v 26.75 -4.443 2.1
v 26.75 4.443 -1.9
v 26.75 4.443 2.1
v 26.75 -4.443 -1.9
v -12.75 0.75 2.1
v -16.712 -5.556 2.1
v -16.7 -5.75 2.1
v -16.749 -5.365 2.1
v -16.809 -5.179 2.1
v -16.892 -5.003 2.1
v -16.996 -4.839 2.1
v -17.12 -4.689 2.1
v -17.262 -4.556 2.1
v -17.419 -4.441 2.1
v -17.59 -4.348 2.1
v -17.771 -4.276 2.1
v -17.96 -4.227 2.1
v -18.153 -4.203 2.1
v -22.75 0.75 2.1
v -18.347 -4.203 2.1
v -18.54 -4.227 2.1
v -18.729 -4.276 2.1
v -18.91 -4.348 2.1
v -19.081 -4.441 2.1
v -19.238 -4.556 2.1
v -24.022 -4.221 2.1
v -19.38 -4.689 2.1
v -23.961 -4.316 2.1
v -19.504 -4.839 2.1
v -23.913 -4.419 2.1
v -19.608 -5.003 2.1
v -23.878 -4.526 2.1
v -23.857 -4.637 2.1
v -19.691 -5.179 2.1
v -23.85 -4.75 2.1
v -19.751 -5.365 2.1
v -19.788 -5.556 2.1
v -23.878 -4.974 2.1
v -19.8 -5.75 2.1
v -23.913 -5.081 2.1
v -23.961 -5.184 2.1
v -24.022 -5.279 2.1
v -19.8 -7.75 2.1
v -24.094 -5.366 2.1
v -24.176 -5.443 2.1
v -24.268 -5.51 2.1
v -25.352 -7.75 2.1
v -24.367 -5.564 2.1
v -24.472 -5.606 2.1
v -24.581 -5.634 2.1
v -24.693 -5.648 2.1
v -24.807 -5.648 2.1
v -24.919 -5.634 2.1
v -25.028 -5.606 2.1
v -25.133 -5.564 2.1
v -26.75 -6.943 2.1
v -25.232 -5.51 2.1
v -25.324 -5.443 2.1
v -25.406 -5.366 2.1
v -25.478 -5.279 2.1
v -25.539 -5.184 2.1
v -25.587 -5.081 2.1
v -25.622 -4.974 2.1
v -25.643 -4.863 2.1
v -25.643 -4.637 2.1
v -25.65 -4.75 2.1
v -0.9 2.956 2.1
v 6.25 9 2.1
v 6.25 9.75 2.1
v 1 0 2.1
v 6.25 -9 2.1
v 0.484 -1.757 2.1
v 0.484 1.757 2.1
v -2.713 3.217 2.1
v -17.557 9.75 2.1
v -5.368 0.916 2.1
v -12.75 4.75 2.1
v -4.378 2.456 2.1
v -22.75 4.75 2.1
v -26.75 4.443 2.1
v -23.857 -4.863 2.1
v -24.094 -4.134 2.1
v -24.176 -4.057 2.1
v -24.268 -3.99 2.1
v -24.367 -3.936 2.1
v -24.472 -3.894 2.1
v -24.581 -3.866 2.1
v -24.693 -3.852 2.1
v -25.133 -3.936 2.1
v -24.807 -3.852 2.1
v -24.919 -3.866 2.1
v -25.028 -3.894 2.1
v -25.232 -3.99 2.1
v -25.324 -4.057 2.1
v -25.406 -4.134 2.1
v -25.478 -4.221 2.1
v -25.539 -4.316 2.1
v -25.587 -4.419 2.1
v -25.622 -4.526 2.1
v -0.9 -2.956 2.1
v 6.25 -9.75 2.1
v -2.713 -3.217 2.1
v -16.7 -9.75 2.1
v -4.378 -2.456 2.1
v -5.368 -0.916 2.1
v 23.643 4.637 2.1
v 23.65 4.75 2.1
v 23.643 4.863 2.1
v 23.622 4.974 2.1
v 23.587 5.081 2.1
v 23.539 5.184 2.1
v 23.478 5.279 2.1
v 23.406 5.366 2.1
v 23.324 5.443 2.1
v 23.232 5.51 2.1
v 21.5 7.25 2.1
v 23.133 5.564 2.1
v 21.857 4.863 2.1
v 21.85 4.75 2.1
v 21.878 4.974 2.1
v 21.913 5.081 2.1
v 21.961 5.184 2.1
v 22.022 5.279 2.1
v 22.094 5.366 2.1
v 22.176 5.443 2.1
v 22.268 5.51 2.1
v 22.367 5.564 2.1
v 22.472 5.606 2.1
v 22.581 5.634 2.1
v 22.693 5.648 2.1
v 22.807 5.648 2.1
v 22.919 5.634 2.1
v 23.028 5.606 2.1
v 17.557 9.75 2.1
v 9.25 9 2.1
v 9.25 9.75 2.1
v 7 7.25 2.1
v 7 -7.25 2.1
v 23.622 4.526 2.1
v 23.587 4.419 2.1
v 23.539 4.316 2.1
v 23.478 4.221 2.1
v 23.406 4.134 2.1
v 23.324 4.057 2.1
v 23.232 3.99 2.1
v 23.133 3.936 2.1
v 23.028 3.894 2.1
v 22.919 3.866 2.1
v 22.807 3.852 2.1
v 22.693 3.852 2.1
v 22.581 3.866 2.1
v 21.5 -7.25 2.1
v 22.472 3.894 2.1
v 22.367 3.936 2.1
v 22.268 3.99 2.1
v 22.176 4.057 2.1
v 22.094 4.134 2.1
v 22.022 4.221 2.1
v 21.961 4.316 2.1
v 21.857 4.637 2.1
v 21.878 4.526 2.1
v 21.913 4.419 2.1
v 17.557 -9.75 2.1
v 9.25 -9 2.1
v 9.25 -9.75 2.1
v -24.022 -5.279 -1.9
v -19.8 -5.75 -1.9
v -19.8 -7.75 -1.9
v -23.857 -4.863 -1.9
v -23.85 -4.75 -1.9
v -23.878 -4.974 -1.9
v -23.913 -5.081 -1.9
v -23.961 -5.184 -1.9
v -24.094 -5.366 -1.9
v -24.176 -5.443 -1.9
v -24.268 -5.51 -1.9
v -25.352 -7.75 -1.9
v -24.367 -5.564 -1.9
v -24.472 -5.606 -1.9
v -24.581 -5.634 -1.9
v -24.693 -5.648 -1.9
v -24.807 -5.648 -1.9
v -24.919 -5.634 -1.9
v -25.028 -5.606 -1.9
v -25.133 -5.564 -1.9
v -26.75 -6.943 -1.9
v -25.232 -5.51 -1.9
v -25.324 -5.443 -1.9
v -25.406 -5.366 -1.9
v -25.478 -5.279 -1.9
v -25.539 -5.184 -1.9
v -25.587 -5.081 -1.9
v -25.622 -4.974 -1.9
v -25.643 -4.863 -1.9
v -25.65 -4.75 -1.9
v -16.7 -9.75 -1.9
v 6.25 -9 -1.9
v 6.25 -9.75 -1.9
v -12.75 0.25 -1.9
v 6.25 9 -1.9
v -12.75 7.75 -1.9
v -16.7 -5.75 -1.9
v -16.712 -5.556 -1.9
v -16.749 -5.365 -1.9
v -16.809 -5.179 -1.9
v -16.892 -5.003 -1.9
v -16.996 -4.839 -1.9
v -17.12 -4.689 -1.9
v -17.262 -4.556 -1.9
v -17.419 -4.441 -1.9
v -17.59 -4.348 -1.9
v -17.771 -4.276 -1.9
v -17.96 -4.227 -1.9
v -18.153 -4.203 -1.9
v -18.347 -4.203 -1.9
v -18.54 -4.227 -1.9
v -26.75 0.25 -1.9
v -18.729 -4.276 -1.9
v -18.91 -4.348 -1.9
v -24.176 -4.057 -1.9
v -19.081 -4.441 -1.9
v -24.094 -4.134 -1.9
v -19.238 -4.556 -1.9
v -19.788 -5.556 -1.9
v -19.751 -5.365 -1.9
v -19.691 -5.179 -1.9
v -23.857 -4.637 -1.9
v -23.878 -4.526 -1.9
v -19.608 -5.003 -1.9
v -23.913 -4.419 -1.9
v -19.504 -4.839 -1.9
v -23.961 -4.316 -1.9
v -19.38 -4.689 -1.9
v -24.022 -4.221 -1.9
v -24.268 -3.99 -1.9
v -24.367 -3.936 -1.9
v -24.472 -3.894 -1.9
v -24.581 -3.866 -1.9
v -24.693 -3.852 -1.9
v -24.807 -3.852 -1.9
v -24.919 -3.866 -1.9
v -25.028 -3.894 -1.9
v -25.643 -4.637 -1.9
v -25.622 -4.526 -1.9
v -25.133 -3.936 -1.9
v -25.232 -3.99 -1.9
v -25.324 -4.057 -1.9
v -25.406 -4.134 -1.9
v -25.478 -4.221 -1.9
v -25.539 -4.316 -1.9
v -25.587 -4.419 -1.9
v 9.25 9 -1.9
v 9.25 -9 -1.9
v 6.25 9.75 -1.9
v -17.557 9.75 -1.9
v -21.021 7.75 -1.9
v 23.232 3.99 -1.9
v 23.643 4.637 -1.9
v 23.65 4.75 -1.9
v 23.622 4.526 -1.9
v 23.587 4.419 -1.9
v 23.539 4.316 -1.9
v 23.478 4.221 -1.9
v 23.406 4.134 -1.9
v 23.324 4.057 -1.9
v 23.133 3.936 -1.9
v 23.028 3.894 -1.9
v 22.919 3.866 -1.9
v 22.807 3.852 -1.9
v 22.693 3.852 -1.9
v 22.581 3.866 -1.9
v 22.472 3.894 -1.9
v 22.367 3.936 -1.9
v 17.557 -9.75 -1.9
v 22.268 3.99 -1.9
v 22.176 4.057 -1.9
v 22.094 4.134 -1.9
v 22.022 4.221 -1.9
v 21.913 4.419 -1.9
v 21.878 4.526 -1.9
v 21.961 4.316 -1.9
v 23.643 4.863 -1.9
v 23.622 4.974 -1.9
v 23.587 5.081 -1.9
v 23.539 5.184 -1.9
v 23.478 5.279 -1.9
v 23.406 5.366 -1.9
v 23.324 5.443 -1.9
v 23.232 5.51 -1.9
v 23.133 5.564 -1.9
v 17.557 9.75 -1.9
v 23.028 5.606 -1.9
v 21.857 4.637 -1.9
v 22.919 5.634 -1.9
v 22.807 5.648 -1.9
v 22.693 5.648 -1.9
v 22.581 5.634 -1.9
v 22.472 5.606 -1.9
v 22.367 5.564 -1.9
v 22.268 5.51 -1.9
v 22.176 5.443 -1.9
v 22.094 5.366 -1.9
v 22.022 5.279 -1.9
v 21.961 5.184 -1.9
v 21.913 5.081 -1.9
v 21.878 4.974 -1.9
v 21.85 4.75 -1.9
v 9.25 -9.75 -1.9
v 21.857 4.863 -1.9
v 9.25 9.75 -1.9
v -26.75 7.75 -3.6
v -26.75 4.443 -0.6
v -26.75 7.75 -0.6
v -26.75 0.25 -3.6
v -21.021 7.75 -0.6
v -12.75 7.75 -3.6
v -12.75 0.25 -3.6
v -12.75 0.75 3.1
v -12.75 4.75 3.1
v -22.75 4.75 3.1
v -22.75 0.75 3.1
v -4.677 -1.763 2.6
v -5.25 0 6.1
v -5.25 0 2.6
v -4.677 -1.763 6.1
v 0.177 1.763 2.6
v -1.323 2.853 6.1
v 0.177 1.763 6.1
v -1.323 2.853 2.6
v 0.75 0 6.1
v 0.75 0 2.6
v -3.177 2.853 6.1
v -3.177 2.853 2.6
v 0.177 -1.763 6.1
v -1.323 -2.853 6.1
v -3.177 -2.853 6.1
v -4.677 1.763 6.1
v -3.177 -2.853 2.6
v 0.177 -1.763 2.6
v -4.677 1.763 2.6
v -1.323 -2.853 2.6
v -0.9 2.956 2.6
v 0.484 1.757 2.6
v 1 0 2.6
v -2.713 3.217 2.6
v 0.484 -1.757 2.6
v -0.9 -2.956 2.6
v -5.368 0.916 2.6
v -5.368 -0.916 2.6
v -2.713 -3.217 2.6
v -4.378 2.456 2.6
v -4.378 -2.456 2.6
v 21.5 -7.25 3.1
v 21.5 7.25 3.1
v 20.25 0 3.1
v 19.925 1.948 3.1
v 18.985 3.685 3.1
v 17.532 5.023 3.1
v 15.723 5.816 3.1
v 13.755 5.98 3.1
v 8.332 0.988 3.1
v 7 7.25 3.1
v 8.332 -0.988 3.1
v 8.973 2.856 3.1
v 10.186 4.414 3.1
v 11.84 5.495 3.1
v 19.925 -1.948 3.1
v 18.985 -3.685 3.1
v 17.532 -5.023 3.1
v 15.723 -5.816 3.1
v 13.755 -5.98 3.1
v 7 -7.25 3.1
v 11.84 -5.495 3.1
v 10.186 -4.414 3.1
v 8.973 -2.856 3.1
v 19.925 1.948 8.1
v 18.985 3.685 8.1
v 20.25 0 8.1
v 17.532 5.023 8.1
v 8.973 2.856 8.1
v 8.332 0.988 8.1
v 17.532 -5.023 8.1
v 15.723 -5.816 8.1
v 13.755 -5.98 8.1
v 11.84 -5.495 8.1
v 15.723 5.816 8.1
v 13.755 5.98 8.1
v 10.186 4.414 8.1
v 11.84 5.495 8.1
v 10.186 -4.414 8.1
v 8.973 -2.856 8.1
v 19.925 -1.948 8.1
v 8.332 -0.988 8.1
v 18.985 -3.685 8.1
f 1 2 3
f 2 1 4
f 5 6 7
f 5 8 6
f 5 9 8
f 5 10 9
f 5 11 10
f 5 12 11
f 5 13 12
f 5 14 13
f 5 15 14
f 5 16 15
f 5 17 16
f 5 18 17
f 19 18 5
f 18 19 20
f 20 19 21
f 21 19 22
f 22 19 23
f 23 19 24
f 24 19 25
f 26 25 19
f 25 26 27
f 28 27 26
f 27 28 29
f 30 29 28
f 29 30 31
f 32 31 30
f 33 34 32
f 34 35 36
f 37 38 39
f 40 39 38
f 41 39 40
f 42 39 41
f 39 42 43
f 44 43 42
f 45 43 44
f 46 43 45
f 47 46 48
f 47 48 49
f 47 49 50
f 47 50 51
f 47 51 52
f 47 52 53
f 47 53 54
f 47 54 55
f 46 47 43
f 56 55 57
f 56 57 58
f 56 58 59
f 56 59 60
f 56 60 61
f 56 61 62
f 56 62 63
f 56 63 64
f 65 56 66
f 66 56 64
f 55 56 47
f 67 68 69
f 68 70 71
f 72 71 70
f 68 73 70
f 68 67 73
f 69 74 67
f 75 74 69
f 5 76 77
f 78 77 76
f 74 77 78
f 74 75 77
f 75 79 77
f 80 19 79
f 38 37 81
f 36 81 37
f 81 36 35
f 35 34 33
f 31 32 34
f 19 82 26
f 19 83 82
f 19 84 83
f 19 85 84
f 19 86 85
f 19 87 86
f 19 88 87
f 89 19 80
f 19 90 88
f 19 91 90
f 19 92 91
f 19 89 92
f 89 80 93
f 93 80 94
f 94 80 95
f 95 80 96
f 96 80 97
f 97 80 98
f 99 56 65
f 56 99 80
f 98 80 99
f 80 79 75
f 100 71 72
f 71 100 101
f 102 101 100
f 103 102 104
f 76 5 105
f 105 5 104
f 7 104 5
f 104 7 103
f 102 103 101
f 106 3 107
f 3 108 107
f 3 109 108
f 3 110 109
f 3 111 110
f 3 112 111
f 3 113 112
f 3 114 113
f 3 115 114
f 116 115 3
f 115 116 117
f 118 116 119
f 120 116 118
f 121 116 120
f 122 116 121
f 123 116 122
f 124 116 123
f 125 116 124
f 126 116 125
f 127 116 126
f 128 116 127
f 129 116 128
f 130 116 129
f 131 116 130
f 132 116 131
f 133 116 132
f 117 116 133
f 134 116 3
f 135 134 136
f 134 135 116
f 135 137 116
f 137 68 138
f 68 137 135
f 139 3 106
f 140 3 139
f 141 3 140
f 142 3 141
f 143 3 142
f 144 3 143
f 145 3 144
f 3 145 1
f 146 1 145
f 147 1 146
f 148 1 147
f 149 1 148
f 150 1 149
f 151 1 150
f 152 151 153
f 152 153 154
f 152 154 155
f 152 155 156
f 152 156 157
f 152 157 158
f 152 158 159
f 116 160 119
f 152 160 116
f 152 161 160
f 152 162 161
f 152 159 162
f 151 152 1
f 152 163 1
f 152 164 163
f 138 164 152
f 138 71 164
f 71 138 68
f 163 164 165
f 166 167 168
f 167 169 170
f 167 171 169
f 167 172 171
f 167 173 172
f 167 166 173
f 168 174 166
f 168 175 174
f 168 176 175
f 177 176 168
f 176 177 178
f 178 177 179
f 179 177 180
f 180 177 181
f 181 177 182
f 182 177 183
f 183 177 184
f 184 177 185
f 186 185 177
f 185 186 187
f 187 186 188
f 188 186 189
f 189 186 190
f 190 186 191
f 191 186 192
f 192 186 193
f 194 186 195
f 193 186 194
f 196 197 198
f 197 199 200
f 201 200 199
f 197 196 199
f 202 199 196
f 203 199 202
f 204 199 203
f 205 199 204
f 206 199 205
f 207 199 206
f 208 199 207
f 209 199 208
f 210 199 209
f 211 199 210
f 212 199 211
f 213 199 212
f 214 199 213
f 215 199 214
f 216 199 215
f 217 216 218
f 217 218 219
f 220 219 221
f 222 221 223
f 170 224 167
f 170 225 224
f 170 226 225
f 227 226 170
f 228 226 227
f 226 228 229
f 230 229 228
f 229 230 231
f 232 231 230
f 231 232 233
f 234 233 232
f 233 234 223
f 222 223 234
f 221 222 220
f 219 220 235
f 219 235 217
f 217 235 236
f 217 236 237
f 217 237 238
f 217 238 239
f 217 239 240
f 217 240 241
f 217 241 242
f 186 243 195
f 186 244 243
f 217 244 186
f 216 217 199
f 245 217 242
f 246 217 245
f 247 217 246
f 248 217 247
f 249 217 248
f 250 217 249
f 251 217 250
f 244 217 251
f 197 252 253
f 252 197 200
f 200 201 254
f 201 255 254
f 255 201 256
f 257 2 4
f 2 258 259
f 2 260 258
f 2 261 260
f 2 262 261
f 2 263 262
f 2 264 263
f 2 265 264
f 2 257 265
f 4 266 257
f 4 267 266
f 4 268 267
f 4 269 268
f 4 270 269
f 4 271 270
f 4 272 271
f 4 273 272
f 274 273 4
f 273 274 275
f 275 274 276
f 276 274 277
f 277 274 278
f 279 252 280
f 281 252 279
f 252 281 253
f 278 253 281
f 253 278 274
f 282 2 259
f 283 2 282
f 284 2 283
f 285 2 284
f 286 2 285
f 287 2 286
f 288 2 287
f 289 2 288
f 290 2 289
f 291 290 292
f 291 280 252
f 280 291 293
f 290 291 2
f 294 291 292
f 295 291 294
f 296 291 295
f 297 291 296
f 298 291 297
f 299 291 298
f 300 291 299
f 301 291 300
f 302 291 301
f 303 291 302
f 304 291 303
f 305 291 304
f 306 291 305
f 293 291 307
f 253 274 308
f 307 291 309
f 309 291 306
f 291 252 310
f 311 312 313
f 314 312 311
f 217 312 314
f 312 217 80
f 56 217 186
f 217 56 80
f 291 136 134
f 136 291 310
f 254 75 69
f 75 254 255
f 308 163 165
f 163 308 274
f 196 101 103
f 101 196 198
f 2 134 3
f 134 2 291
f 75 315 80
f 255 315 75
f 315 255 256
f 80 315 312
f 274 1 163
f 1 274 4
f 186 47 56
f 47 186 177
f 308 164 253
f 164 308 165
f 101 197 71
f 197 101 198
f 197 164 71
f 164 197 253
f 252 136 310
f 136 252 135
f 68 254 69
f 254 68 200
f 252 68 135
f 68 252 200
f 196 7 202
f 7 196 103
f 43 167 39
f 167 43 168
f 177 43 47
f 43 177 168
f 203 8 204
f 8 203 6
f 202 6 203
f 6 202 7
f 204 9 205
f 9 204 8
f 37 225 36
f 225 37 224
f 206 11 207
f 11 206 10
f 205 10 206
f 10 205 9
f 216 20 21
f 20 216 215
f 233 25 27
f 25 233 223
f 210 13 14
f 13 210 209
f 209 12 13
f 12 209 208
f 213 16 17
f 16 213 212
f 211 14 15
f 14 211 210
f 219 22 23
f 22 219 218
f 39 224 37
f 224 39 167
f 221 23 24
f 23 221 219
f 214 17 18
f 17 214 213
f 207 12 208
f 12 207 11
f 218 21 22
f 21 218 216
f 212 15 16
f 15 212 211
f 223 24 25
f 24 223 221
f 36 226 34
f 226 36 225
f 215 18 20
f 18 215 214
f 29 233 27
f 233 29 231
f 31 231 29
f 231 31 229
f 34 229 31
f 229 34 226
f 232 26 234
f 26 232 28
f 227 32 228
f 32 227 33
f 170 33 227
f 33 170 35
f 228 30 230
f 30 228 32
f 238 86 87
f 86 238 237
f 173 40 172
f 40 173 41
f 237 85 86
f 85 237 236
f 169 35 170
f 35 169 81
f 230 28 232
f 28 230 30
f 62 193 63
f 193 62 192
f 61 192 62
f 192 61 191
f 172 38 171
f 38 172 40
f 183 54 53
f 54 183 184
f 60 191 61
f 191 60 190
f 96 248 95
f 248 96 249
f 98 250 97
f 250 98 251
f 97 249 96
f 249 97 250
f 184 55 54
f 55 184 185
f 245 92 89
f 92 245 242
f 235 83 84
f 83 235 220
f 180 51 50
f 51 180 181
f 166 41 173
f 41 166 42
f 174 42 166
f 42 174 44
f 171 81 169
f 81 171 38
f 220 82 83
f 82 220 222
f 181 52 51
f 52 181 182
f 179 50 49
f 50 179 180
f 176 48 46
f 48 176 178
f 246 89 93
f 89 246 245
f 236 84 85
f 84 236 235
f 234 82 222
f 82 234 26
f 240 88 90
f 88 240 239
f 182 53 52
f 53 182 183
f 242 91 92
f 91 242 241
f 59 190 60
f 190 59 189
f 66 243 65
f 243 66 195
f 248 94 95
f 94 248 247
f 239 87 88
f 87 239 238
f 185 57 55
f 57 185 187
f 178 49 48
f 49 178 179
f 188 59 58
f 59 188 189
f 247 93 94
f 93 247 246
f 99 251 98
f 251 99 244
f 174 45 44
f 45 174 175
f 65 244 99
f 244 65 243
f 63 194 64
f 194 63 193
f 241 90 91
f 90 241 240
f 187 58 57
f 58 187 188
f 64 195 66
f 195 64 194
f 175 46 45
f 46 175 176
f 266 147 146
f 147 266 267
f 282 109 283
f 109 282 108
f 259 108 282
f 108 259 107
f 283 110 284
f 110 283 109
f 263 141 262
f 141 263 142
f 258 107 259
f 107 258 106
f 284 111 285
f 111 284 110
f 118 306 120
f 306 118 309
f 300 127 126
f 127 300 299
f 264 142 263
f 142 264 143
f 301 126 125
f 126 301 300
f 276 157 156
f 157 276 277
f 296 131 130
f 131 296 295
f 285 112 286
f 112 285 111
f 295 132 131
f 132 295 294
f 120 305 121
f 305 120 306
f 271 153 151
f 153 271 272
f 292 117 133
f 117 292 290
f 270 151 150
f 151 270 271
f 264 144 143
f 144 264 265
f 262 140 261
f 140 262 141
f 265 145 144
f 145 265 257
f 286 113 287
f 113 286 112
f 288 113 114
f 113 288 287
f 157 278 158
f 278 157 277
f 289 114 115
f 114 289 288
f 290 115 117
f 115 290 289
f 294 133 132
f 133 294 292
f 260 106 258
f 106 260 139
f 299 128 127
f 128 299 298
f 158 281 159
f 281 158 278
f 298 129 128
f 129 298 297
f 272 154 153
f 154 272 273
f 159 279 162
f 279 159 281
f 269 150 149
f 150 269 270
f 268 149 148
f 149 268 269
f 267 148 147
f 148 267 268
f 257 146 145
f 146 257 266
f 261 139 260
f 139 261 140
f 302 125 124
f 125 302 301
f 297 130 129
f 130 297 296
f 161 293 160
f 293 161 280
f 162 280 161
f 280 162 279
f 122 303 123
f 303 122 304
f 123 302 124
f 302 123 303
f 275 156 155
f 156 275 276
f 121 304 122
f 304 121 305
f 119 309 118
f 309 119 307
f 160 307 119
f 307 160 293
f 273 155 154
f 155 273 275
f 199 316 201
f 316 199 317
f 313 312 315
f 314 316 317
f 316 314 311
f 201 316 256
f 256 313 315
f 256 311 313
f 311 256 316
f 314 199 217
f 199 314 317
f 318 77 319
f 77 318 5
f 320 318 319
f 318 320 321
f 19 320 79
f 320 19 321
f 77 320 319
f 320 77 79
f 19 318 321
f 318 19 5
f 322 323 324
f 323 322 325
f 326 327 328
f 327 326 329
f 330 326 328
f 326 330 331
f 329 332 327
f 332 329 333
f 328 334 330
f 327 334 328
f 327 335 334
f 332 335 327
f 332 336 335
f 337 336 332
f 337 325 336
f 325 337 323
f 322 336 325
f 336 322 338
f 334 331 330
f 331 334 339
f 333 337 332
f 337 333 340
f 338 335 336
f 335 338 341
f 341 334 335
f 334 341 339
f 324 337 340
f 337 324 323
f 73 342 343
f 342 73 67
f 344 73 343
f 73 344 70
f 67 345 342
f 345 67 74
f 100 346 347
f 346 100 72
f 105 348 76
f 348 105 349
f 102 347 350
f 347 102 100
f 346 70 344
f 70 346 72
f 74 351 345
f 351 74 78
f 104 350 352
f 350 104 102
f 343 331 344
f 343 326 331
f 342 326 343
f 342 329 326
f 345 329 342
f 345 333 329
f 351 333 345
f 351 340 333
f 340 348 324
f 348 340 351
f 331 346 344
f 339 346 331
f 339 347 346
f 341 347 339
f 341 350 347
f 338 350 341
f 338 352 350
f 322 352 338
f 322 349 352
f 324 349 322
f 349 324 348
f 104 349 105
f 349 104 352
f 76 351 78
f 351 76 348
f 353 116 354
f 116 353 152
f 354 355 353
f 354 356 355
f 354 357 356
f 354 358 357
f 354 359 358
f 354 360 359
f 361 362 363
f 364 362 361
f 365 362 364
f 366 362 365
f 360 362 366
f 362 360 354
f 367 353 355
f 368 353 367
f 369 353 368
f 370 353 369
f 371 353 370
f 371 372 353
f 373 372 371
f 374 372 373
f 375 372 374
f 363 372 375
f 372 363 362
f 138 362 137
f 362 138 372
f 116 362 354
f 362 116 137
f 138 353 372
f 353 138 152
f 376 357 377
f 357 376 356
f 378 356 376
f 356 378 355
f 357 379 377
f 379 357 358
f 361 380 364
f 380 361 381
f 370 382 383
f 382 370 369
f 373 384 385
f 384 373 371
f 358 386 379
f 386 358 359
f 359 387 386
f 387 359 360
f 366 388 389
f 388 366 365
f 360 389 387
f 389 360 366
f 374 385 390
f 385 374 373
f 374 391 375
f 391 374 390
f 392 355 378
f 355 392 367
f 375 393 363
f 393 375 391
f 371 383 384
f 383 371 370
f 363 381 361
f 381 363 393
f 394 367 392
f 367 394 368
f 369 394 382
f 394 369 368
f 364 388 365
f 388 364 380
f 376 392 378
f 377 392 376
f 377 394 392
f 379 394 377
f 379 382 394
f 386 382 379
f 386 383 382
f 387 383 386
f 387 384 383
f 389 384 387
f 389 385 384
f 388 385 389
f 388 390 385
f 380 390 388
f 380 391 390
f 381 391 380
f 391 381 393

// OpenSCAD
module camera() {
union() {
color("green") difference() {
translate([0,0,0.1])cube([53.5,19.5,4],center=true);

translate([35,17,0]) rotate([0,0,60]) cube([30,30,30],center=true);
translate([-35,17,0]) rotate([0,0,-60]) cube([30,30,30],center=true);
translate([35,-17,0]) rotate([0,0,-60]) cube([30,30,30],center=true);
translate([-35,-17-2.5,0]) rotate([0,0,60]) cube([30,30,30],center=true);
translate([53.5/2-17.5-3/2,-19.5/2,0]) cube([3,1.5,10],center=true);
translate([53.5/2-17.5-3/2,19.5/2,0]) cube([3,1.5,10],center=true);
translate([-53.5/2+10-3/2,-19.5/2,0]) cube([3.1,8,10],center=true);
translate([-53.5/2,-19.5/2+2-1.5,0]) cube([18,3,10],center=true);
translate([-53.5/2+10-3/2,-19.5/2+4,0]) cylinder(r=1.55,h=10,center=true,$fn=50);

translate([-53.5/2+2,-19.5/2+5,0]) cylinder(r=0.9,h=8,center=true,$fn=50);
translate([53.5/2-4,19.5/2-5,0]) cylinder(r=0.9,h=8,center=true,$fn=50);

}
color("white") translate([-53.5/2+7,19.5/2-2-7.5/2,-1.2/2-3/2]) cube([14,7.5,3],center=true);
color("silver") translate([-53.5/2+9,19.5/2-5-4/2,1.2/2+2.5/2]) cube([10,4,2.5],center=true);

color("silver") translate([53.5/2-29,0,1.2/2+5.5/2]) cylinder(r=6/2,h=5.5,center=true);
color("black") translate([53.5/2-29,0,1.2/2+1]) cylinder(r=6.5/2,h=2,center=true);

color("black") translate([53.5/2-12.5,0,1.2/2+2.5/2]) cube([14.5,14.5,2.5],center=true);
color("black") translate([53.5/2-12.5,0,1.2/2+7.5/2]) cylinder(r=6,h=7.5,center=true);
}

}

module camera_boundaries() {
union() {
minkowski() {
camera();
cube([1,1,1],center=true);
}
translate([-53.5/2+2,-19.5/2+5,-2-2.5]) cylinder(r=0.9,h=4,center=true,$fn=50);
translate([53.5/2-4,19.5/2-5,-2-2.5]) cylinder(r=0.9,h=4,center=true,$fn=50);
}
}

camera();
//%camera_boundaries();
